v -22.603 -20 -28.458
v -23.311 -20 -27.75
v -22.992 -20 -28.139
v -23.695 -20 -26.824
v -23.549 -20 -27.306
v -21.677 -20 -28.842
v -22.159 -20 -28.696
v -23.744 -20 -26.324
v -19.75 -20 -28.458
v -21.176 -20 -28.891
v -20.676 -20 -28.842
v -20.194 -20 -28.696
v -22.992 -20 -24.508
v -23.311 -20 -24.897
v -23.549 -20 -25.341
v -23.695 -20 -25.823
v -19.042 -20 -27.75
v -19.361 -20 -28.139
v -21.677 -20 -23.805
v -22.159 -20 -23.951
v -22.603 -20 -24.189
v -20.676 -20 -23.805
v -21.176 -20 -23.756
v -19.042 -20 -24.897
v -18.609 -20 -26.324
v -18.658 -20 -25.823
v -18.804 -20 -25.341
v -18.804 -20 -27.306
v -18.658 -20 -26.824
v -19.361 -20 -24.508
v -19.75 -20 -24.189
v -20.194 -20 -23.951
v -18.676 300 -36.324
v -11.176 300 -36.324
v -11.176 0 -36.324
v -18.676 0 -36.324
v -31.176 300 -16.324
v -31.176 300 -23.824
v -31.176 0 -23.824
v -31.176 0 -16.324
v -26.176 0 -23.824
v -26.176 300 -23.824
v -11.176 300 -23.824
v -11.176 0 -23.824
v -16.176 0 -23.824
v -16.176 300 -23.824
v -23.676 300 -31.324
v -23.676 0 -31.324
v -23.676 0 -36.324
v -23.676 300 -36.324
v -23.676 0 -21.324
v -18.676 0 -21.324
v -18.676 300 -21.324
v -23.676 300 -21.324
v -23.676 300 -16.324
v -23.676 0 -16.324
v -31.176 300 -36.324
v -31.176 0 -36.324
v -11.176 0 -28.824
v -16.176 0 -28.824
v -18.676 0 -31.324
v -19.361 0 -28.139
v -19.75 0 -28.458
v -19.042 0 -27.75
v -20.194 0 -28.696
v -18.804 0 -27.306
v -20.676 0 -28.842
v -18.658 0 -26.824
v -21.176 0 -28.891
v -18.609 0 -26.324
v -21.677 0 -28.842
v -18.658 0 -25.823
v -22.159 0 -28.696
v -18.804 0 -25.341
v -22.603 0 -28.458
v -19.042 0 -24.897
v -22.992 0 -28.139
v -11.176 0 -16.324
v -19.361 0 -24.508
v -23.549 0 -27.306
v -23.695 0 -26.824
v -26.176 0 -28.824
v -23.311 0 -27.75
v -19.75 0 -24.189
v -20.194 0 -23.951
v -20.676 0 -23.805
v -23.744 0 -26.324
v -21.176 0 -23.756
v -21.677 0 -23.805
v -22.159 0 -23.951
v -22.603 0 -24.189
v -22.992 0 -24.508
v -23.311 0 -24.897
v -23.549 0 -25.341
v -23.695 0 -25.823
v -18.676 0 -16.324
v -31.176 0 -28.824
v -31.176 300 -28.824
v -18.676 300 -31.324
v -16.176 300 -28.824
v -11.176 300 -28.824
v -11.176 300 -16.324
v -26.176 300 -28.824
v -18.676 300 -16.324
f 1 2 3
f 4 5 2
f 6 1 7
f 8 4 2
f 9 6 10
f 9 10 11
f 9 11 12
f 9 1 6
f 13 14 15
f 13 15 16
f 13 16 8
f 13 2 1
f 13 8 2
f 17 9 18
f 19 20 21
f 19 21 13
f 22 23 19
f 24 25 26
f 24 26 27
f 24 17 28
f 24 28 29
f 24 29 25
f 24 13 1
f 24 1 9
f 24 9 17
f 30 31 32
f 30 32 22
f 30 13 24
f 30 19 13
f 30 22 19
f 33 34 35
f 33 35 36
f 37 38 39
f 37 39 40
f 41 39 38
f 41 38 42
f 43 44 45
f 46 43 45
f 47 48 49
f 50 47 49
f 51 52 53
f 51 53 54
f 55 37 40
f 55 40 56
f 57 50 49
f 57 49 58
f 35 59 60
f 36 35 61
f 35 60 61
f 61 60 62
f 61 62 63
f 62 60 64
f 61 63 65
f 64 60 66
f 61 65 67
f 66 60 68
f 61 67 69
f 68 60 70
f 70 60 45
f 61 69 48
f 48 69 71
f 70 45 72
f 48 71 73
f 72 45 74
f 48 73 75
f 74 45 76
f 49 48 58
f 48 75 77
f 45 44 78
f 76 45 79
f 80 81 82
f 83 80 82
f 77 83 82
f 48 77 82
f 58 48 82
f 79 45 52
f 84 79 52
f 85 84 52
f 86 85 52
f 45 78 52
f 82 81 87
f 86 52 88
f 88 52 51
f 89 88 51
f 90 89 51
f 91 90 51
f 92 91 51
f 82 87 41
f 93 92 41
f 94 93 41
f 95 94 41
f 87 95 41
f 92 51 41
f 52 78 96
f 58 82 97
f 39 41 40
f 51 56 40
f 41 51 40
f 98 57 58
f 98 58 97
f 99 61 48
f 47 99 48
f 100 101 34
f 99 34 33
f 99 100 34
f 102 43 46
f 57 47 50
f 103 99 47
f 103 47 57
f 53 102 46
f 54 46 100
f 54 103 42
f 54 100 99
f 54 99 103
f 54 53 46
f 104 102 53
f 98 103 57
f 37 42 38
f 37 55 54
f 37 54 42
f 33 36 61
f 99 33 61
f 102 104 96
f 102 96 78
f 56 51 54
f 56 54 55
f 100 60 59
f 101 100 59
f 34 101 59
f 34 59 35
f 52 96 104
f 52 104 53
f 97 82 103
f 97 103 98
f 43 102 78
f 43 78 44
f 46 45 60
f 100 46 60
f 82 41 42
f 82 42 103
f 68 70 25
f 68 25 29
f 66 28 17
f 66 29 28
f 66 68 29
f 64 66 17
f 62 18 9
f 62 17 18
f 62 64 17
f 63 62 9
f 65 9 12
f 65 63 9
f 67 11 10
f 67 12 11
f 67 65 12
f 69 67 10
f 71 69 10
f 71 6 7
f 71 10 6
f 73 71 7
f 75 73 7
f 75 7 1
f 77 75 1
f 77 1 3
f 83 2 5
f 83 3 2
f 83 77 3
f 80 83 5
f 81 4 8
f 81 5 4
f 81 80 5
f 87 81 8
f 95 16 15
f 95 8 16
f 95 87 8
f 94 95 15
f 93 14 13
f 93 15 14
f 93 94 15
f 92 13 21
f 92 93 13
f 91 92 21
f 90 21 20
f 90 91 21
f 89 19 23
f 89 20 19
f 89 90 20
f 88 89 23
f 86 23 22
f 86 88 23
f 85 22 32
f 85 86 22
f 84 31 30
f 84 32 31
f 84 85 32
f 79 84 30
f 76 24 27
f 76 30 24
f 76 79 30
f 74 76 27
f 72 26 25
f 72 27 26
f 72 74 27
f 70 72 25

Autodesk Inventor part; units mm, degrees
ref_plane "YZ Plane" through (0, 0, 0) normal (1, 0, 0) x (0, 1, 0)
ref_plane "XZ Plane" through (0, 0, 0) normal (0, 1, 0) x (-1, 0, 0)
ref_plane "XY Plane" through (0, 0, 0) normal (0, 0, 1) x (1, 0, 0)
sketch "Skizze1" plane through (0, 0, 0) normal (0, 1, 0) x (-1, 0, 0)
  line L0 (31.1765, -16.3235) -> (11.1765, -16.3235)
  line L1 (11.1765, -16.3235) -> (11.1765, -36.3235)
  line L2 (11.1765, -36.3235) -> (31.1765, -36.3235)
  line L3 (31.1765, -36.3235) -> (31.1765, -16.3235)
  point P0 (0, 0)
  dimension "d0" = 20
  dimension "d1" = 20
extrude "Extrusion1" add sketch "Skizze1" along normal blind 300
sketch "Skizze2" plane through (0, 0, 0) normal (0, -1, 0) x (1, 0, 0)
  line L0 (-11.1765, -16.3235) -> (-11.1765, -36.3235) projected
  line L1 (-31.1765, -16.3235) -> (-11.1765, -16.3235) projected
  circle A0 centre (-21.1765, -26.3235) radius 2.5676
  point P0 (0, 0)
  dimension "d5" = 10
  dimension "d6" = 10
extrude "Extrusion2" add sketch "Skizze2" along normal blind 20
sketch "Skizze3" plane through (0, 300, 0) normal (0, 1, 0) x (1, 0, 0)
  line L0 (-11.1765, 16.3235) -> (-11.1765, 36.3235) projected
  line L1 (-11.1765, 23.8235) -> (-16.1765, 23.8235)
  line L2 (-16.1765, 23.8235) -> (-16.1765, 28.8235)
  line L3 (-16.1765, 28.8235) -> (-11.1765, 28.8235)
  line L4 (-11.1765, 28.8235) -> (-11.1765, 23.8235)
  line L5 (-11.1765, 36.3235) -> (-31.1765, 36.3235) projected
  line L6 (-23.6765, 36.3235) -> (-18.6765, 36.3235)
  line L7 (-18.6765, 36.3235) -> (-18.6765, 31.3235)
  line L8 (-18.6765, 31.3235) -> (-23.6765, 31.3235)
  line L9 (-23.6765, 31.3235) -> (-23.6765, 36.3235)
  line L10 (-31.1765, 23.8235) -> (-26.1765, 23.8235)
  line L11 (-26.1765, 23.8235) -> (-26.1765, 28.8235)
  line L12 (-26.1765, 28.8235) -> (-31.1765, 28.8235)
  line L13 (-31.1765, 28.8235) -> (-31.1765, 23.8235)
  line L14 (-31.1765, 16.3235) -> (-11.1765, 16.3235) projected
  line L15 (-23.6765, 16.3235) -> (-18.6765, 16.3235)
  line L16 (-18.6765, 16.3235) -> (-18.6765, 21.3235)
  line L17 (-18.6765, 21.3235) -> (-23.6765, 21.3235)
  line L18 (-23.6765, 21.3235) -> (-23.6765, 16.3235)
  line L19 (-31.1765, 36.3235) -> (-31.1765, 16.3235) projected
  point P0 (0, 0)
  dimension "d9" = 5
  dimension "d10" = 7.5
  dimension "d11" = 7.5
  dimension "d12" = 5
  dimension "d13" = 7.5
  dimension "d14" = 5
  dimension "d15" = 5
  dimension "d16" = 7.5
  dimension "d17" = 5
  dimension "d18" = 5
  dimension "d19" = 5
  dimension "d20" = 5
extrude "Extrusion3" cut sketch "Skizze3" against normal blind 300 contours L1 L2 L3 L0 | L14 L18 L17 L16 | L7 L8 L9 L5 | L13 L12 L11 L10
properties material "Aluminium 6061"
